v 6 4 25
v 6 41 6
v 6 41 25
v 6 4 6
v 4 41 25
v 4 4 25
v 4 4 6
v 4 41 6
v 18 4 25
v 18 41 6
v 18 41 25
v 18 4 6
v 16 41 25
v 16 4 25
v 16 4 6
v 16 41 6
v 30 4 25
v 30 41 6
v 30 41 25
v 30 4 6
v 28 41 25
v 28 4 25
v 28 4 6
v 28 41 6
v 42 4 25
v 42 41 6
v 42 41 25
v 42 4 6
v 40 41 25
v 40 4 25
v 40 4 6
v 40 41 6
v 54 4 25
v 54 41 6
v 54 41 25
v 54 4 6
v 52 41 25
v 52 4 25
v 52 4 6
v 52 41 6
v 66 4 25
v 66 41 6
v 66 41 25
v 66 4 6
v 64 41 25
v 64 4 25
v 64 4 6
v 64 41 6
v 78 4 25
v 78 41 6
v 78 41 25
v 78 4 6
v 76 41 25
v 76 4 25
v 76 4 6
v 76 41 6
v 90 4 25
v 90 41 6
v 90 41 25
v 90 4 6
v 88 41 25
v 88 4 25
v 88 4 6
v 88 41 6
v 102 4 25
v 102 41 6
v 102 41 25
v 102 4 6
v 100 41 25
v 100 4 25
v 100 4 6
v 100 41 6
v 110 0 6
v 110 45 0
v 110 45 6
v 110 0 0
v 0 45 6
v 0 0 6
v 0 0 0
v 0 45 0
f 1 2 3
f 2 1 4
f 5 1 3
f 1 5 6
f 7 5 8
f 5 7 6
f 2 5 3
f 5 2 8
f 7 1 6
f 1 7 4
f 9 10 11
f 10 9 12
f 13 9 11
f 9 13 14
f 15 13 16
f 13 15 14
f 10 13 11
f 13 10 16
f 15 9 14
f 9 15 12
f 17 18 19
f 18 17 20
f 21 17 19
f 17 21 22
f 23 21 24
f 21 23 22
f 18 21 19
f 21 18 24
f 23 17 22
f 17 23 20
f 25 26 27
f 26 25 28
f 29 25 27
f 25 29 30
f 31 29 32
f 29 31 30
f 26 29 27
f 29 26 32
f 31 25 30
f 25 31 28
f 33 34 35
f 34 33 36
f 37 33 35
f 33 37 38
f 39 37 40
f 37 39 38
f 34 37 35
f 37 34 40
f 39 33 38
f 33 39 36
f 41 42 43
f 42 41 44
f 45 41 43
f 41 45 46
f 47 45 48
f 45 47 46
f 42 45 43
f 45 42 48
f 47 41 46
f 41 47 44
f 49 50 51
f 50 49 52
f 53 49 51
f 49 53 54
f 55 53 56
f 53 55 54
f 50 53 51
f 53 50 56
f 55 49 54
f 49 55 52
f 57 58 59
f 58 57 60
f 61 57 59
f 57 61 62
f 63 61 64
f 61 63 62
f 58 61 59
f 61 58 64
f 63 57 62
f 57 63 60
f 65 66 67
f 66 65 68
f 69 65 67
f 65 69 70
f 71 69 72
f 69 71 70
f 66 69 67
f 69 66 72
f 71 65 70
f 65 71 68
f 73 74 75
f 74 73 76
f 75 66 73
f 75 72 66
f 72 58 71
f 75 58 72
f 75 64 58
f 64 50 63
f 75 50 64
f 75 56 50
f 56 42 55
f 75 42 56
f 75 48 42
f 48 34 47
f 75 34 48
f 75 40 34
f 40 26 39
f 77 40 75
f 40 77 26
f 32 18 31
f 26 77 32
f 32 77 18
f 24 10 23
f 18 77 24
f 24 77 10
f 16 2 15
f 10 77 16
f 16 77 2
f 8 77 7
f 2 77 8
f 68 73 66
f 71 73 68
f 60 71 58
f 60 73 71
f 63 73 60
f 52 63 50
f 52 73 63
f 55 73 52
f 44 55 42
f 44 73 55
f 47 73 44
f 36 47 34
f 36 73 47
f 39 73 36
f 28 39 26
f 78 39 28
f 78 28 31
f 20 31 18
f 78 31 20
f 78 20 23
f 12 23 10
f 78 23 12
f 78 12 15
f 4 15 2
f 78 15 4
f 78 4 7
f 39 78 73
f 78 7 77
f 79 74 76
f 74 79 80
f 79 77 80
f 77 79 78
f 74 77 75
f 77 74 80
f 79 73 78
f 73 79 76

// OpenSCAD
$fn = 32;

// ----------------------------------------------------------------------
// Heatsink: uniform fin block
// ----------------------------------------------------------------------

// --- parameters (mm) ---
base_l = 110;             // base length, X
base_w = 45;              // base width, Y
base_t = 6;               // base plate thickness
fin_h = 20;               // fin height above the base
fin_t = 2;                // fin thickness
edge = 4;                 // margin from the base ends
pitch = 12;               // fin pitch

n_fins = floor((base_l - 2 * edge - fin_t) / pitch) + 1;  // fin count
total_h = base_t + fin_h - 1;  // overall height

union() {
  cube([base_l, base_w, base_t]);
  for (i = [0 : n_fins - 1])
    translate([edge + i * pitch, edge, base_t - 1])
      cube([fin_t, base_w - 2 * edge, fin_h]);
}
